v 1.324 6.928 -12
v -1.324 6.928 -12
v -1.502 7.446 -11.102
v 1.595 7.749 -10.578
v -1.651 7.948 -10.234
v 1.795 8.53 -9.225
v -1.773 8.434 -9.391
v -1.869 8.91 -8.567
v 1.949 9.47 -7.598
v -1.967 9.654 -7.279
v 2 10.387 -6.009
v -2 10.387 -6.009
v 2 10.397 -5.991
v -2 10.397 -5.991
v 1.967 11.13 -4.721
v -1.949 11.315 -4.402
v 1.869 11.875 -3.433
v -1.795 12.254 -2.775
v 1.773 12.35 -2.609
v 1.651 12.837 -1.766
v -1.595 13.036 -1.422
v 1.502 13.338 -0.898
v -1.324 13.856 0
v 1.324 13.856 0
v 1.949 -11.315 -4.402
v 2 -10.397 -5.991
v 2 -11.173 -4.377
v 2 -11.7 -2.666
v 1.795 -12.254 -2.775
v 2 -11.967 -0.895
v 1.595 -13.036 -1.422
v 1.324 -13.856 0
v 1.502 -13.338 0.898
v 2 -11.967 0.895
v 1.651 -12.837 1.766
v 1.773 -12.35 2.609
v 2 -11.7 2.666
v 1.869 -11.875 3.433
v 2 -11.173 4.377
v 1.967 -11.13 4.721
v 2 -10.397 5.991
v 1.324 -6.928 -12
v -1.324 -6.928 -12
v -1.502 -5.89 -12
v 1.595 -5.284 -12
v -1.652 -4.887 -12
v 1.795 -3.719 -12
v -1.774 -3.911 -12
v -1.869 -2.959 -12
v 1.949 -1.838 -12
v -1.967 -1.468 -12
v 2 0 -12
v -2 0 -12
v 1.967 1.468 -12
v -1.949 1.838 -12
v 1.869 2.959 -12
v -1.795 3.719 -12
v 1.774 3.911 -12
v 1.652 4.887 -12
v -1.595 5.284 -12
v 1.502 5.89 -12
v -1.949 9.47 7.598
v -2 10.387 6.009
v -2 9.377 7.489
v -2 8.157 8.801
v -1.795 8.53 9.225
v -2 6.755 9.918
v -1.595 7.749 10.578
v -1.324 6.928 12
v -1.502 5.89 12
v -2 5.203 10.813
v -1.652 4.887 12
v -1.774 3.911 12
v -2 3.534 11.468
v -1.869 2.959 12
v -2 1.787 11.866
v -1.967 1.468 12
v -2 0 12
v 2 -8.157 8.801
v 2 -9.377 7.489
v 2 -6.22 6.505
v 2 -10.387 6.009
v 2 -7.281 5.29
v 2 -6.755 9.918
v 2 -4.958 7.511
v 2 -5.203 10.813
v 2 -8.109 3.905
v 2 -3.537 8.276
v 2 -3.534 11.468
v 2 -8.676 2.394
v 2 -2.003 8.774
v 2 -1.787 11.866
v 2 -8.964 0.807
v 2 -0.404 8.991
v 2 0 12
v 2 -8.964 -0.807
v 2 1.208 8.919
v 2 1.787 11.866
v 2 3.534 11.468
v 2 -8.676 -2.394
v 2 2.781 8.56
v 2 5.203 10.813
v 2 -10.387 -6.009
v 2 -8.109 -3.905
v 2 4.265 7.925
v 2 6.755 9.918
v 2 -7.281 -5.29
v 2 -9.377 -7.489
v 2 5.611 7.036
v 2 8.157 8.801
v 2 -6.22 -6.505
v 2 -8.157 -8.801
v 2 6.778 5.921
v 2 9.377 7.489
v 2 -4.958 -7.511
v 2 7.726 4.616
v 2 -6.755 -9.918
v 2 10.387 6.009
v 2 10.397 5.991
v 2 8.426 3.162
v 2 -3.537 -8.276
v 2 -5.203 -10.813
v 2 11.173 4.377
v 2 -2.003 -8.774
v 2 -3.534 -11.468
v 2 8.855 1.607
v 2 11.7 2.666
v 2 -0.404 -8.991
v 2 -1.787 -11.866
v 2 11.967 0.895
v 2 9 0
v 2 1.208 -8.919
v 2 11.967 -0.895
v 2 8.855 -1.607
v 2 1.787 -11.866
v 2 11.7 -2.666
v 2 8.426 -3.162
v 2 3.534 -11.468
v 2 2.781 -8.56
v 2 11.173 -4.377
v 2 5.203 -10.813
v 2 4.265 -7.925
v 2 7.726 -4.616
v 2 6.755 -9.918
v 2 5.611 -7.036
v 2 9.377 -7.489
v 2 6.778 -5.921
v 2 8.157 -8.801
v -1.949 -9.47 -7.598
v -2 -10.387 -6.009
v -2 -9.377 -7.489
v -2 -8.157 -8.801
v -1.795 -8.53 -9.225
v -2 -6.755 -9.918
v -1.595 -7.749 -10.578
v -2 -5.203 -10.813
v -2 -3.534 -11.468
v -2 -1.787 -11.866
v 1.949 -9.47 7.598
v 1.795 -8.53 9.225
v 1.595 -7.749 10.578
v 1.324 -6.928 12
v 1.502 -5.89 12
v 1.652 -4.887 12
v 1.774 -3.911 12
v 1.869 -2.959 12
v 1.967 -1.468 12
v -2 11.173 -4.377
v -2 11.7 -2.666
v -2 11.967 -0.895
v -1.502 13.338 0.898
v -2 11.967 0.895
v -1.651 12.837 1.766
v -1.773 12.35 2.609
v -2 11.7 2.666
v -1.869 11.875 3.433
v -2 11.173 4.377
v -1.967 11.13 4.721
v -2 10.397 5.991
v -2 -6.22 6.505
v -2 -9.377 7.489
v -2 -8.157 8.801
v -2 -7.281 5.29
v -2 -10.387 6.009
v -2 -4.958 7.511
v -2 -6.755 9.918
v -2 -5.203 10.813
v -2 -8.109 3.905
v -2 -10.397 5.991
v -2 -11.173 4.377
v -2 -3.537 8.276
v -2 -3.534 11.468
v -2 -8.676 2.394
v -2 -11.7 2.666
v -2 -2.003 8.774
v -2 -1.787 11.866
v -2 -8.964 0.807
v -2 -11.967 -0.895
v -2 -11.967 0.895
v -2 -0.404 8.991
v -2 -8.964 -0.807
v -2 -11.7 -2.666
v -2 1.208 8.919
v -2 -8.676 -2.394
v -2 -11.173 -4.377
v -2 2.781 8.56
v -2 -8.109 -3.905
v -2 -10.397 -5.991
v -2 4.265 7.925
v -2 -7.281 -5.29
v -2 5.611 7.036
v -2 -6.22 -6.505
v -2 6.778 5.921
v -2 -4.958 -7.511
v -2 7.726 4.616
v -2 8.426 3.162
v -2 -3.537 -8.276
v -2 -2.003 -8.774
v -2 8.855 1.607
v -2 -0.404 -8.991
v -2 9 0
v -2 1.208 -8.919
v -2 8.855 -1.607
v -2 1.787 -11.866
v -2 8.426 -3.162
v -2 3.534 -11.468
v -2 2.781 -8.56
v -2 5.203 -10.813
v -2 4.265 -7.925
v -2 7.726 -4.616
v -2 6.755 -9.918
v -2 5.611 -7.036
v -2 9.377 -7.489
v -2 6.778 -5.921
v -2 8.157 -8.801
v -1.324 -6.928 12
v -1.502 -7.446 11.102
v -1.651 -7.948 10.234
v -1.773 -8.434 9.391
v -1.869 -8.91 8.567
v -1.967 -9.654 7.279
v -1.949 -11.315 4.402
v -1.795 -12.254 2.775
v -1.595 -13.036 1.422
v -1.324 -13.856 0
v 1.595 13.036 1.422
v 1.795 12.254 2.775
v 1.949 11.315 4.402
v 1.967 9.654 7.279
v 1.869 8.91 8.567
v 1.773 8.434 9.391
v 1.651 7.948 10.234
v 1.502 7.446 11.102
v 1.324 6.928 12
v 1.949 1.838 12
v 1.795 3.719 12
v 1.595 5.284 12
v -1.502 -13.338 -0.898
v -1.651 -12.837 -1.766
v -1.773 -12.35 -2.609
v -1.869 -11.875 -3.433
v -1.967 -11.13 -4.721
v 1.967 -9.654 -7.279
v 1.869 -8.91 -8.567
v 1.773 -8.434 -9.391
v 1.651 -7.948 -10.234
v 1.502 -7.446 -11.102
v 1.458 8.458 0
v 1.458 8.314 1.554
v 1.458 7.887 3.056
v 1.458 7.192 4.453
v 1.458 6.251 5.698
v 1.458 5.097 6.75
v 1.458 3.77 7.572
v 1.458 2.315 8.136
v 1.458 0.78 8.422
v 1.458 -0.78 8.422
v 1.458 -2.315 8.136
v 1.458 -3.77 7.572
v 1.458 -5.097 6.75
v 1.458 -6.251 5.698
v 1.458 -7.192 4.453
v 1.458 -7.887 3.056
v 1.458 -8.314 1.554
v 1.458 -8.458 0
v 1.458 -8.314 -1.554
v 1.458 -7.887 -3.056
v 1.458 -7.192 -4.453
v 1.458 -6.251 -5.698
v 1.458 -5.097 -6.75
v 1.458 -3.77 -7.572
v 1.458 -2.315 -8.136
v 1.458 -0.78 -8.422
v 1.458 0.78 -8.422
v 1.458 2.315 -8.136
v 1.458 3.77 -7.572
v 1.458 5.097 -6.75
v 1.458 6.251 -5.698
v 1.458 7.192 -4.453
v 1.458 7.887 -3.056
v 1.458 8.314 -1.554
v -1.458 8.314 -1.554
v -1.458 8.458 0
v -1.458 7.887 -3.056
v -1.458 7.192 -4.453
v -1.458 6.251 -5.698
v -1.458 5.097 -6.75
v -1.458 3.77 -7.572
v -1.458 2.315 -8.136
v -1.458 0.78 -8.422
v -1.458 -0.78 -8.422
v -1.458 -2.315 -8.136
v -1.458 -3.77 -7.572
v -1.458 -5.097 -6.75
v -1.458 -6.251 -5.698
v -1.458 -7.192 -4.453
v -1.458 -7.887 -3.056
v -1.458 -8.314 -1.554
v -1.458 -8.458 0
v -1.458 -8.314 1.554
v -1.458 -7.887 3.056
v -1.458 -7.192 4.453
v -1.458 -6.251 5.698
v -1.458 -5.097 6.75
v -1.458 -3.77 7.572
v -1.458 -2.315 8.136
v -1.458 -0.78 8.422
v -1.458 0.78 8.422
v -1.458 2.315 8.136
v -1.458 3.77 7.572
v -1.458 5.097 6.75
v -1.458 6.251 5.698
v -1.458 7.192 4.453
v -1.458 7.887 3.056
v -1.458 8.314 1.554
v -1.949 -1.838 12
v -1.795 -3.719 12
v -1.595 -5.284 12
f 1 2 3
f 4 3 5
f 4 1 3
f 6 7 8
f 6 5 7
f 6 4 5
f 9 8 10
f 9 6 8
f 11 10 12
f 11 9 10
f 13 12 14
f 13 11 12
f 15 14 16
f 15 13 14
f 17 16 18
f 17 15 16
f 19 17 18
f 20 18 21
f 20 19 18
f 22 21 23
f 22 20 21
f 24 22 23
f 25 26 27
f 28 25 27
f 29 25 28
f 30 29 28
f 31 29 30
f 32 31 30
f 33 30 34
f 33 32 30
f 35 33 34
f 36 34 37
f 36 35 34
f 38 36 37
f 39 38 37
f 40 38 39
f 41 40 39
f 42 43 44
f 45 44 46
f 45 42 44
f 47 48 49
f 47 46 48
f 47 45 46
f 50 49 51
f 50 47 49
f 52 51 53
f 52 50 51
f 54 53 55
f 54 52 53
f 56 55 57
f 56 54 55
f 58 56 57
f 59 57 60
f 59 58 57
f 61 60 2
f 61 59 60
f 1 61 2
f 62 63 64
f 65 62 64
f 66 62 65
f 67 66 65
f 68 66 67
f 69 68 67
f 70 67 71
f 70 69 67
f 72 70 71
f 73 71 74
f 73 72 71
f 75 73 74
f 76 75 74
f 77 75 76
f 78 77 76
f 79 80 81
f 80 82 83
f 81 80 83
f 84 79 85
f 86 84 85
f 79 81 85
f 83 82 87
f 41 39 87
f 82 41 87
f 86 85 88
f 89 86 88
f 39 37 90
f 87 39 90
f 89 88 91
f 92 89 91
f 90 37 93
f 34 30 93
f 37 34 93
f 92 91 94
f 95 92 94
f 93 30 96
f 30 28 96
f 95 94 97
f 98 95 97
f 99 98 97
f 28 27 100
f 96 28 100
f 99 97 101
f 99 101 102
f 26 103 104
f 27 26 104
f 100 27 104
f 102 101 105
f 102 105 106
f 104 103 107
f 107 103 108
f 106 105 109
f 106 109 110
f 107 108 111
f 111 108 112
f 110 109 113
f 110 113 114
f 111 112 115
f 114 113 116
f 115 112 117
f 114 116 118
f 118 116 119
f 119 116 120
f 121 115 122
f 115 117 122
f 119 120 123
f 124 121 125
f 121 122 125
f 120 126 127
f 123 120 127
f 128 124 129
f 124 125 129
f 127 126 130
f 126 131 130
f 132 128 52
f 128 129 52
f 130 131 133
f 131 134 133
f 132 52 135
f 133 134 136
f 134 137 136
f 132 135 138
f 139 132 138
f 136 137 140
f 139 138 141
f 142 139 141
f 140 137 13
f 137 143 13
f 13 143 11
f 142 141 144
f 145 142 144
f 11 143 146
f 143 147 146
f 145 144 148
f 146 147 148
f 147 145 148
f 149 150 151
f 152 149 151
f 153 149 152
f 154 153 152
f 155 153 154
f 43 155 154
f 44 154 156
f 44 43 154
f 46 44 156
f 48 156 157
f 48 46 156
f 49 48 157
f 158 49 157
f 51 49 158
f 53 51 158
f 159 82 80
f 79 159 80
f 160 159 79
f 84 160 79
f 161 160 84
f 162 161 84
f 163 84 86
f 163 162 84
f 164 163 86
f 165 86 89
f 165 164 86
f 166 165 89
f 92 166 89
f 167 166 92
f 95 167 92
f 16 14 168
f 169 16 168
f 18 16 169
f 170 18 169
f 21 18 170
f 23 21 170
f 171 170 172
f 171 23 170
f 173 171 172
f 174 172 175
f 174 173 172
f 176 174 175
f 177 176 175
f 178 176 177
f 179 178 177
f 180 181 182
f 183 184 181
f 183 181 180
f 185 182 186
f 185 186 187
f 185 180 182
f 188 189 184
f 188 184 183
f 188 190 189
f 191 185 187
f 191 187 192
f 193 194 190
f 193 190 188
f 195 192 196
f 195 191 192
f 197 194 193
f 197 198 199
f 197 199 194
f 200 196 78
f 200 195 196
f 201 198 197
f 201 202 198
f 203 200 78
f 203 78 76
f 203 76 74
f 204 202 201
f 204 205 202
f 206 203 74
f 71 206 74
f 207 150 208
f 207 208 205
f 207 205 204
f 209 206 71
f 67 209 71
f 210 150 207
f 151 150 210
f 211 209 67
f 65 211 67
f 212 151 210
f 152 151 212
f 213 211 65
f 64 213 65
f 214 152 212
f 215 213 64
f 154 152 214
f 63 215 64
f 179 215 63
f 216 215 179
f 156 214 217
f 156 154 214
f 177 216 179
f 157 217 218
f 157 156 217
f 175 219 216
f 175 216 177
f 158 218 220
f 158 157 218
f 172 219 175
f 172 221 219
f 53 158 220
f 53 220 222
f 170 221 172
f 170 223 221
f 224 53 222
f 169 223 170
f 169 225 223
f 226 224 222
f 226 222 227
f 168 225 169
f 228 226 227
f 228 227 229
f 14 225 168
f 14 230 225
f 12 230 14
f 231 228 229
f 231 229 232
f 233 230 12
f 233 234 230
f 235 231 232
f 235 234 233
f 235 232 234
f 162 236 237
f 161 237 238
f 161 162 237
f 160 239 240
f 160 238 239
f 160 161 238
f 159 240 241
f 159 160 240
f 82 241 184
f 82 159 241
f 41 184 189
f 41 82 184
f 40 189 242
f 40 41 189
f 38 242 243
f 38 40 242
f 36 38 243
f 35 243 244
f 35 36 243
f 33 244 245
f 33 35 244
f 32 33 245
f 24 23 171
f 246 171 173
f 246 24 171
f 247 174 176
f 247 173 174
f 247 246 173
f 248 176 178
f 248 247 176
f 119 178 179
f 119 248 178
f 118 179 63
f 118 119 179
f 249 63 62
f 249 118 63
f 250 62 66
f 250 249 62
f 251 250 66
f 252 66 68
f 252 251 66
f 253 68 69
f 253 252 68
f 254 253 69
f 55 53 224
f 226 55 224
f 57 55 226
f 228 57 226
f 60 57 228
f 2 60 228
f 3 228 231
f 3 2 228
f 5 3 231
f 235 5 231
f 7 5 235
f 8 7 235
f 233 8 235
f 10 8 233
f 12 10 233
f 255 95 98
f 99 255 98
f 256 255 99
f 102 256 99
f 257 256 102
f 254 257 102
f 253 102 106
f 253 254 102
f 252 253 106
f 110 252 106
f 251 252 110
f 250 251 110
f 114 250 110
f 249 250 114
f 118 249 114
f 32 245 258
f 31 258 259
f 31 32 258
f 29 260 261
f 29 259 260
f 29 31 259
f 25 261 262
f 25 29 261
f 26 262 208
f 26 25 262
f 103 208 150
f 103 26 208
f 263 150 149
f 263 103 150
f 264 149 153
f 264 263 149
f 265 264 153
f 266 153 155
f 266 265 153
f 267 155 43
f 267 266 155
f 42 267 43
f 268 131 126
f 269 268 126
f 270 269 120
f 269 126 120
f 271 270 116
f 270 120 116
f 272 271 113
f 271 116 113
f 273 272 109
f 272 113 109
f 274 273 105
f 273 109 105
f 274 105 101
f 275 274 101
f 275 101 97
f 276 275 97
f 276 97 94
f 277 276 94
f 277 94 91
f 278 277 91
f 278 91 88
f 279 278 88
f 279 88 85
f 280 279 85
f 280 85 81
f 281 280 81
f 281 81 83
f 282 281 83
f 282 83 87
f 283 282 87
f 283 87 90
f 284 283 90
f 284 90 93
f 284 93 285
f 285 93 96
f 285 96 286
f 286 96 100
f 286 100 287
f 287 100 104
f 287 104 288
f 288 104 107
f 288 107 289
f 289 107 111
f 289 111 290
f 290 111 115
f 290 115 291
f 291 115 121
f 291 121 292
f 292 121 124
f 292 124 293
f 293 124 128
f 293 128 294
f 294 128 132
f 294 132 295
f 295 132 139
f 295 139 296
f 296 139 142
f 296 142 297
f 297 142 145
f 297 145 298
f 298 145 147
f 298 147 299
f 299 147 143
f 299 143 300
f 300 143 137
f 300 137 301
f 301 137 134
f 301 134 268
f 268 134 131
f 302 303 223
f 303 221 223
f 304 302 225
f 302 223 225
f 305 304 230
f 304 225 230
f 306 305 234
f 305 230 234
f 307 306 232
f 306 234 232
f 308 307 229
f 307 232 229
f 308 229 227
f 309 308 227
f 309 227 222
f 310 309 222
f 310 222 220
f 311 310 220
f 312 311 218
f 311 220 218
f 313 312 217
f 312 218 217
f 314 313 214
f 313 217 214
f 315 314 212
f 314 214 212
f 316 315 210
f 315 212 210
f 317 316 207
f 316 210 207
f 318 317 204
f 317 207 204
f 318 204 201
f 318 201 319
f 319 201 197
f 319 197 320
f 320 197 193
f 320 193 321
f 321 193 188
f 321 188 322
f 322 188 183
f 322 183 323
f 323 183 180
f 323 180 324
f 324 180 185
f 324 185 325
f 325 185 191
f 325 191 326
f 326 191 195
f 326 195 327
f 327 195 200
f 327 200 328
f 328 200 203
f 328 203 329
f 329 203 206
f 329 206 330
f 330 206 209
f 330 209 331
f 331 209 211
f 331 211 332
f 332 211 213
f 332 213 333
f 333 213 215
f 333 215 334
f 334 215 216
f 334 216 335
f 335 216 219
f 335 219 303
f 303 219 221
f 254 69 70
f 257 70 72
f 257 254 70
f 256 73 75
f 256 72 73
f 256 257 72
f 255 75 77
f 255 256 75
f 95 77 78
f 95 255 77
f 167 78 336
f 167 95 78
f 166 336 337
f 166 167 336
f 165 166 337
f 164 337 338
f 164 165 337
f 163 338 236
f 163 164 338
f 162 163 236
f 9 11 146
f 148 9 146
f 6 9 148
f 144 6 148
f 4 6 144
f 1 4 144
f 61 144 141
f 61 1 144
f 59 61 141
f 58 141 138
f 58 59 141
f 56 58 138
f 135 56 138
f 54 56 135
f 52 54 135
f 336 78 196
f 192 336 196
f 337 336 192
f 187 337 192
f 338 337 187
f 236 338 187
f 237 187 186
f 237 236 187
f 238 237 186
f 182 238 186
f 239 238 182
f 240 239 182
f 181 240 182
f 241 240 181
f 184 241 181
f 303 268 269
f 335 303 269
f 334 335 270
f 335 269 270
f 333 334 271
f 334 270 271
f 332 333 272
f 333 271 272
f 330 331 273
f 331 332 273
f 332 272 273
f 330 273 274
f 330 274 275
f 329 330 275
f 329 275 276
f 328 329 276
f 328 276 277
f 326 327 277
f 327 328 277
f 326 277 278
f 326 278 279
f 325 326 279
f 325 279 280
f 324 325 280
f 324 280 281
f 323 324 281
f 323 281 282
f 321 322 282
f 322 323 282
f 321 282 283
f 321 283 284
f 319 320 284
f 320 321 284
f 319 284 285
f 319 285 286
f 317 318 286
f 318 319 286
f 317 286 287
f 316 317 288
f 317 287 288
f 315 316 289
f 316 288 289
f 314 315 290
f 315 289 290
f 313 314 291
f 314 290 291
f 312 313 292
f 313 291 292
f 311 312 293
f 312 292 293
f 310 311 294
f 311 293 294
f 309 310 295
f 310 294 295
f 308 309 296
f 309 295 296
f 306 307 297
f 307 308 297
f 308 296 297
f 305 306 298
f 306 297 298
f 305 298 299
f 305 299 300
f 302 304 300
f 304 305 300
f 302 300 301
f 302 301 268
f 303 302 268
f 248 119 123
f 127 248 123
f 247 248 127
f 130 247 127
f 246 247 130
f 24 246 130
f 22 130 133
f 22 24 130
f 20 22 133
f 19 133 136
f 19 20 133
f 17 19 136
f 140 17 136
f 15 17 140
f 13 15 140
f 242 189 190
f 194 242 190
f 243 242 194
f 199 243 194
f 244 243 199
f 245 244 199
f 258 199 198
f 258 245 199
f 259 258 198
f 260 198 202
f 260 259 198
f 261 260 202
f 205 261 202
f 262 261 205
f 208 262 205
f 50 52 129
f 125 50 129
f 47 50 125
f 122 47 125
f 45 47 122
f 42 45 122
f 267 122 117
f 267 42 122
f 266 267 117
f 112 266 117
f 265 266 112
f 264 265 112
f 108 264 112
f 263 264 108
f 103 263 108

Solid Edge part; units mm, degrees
sketch "Sketch1" plane through (0, 0, 0) normal (0, 0, 1) x (1, 0, 0)
  line L0 (-2, 0) -> (-2, 12)
  line L1 (-2, 12) -> (-1.1265, 14.4)
  line L2 (-1.1265, 14.4) -> (1.1265, 14.4)
  line L3 (1.1265, 14.4) -> (2, 12)
  line L4 (2, 12) -> (2, 0)
  line L5 (2, 0) -> (-2, 0)
revolve "RevolvedProtrusion1" add sketch "Sketch1" angle 360 about axis through (2, 0, 0) along (-1, 0, 0)
sketch "Sketch2" plane through (0, 0, 0) normal (1, 0, 0) x (0, 1, 0)
  line L0 (24, 24) -> (-24, 24)
  line L1 (-24, 24) -> (-24, -24)
  line L2 (-24, -24) -> (24, -24)
  line L3 (24, -24) -> (24, 24)
  line L4 (-6.9282, 12) -> (-13.8564, 0)
  line L5 (-13.8564, 0) -> (-6.9282, -12)
  line L6 (-6.9282, -12) -> (6.9282, -12)
  line L7 (6.9282, -12) -> (13.8564, 0)
  line L8 (13.8564, 0) -> (6.9282, 12)
  line L9 (6.9282, 12) -> (-6.9282, 12)
extrude "Extrusionsausschnitt_1" cut sketch "Sketch2" against normal blind 4 and the other way blind 4
sketch "Sketch3" plane through (0, 0, 0) normal (0, 0, 1) x (1, 0, 0)
  line L0 (-2, 0) -> (-2, 9)
  line L1 (-2, 9) -> (-1.4585, 8.4585)
  line L2 (-1.4585, 8.4585) -> (1.4585, 8.4585)
  line L3 (1.4585, 8.4585) -> (2, 9)
  line L4 (2, 9) -> (2, 0)
  line L5 (2, 0) -> (-2, 0)
revolve "RevolvedCutout1" cut sketch "Sketch3" angle 360 about axis through (2, 0, 0) along (-1, 0, 0)
properties part number "Nut M18 x 1"
